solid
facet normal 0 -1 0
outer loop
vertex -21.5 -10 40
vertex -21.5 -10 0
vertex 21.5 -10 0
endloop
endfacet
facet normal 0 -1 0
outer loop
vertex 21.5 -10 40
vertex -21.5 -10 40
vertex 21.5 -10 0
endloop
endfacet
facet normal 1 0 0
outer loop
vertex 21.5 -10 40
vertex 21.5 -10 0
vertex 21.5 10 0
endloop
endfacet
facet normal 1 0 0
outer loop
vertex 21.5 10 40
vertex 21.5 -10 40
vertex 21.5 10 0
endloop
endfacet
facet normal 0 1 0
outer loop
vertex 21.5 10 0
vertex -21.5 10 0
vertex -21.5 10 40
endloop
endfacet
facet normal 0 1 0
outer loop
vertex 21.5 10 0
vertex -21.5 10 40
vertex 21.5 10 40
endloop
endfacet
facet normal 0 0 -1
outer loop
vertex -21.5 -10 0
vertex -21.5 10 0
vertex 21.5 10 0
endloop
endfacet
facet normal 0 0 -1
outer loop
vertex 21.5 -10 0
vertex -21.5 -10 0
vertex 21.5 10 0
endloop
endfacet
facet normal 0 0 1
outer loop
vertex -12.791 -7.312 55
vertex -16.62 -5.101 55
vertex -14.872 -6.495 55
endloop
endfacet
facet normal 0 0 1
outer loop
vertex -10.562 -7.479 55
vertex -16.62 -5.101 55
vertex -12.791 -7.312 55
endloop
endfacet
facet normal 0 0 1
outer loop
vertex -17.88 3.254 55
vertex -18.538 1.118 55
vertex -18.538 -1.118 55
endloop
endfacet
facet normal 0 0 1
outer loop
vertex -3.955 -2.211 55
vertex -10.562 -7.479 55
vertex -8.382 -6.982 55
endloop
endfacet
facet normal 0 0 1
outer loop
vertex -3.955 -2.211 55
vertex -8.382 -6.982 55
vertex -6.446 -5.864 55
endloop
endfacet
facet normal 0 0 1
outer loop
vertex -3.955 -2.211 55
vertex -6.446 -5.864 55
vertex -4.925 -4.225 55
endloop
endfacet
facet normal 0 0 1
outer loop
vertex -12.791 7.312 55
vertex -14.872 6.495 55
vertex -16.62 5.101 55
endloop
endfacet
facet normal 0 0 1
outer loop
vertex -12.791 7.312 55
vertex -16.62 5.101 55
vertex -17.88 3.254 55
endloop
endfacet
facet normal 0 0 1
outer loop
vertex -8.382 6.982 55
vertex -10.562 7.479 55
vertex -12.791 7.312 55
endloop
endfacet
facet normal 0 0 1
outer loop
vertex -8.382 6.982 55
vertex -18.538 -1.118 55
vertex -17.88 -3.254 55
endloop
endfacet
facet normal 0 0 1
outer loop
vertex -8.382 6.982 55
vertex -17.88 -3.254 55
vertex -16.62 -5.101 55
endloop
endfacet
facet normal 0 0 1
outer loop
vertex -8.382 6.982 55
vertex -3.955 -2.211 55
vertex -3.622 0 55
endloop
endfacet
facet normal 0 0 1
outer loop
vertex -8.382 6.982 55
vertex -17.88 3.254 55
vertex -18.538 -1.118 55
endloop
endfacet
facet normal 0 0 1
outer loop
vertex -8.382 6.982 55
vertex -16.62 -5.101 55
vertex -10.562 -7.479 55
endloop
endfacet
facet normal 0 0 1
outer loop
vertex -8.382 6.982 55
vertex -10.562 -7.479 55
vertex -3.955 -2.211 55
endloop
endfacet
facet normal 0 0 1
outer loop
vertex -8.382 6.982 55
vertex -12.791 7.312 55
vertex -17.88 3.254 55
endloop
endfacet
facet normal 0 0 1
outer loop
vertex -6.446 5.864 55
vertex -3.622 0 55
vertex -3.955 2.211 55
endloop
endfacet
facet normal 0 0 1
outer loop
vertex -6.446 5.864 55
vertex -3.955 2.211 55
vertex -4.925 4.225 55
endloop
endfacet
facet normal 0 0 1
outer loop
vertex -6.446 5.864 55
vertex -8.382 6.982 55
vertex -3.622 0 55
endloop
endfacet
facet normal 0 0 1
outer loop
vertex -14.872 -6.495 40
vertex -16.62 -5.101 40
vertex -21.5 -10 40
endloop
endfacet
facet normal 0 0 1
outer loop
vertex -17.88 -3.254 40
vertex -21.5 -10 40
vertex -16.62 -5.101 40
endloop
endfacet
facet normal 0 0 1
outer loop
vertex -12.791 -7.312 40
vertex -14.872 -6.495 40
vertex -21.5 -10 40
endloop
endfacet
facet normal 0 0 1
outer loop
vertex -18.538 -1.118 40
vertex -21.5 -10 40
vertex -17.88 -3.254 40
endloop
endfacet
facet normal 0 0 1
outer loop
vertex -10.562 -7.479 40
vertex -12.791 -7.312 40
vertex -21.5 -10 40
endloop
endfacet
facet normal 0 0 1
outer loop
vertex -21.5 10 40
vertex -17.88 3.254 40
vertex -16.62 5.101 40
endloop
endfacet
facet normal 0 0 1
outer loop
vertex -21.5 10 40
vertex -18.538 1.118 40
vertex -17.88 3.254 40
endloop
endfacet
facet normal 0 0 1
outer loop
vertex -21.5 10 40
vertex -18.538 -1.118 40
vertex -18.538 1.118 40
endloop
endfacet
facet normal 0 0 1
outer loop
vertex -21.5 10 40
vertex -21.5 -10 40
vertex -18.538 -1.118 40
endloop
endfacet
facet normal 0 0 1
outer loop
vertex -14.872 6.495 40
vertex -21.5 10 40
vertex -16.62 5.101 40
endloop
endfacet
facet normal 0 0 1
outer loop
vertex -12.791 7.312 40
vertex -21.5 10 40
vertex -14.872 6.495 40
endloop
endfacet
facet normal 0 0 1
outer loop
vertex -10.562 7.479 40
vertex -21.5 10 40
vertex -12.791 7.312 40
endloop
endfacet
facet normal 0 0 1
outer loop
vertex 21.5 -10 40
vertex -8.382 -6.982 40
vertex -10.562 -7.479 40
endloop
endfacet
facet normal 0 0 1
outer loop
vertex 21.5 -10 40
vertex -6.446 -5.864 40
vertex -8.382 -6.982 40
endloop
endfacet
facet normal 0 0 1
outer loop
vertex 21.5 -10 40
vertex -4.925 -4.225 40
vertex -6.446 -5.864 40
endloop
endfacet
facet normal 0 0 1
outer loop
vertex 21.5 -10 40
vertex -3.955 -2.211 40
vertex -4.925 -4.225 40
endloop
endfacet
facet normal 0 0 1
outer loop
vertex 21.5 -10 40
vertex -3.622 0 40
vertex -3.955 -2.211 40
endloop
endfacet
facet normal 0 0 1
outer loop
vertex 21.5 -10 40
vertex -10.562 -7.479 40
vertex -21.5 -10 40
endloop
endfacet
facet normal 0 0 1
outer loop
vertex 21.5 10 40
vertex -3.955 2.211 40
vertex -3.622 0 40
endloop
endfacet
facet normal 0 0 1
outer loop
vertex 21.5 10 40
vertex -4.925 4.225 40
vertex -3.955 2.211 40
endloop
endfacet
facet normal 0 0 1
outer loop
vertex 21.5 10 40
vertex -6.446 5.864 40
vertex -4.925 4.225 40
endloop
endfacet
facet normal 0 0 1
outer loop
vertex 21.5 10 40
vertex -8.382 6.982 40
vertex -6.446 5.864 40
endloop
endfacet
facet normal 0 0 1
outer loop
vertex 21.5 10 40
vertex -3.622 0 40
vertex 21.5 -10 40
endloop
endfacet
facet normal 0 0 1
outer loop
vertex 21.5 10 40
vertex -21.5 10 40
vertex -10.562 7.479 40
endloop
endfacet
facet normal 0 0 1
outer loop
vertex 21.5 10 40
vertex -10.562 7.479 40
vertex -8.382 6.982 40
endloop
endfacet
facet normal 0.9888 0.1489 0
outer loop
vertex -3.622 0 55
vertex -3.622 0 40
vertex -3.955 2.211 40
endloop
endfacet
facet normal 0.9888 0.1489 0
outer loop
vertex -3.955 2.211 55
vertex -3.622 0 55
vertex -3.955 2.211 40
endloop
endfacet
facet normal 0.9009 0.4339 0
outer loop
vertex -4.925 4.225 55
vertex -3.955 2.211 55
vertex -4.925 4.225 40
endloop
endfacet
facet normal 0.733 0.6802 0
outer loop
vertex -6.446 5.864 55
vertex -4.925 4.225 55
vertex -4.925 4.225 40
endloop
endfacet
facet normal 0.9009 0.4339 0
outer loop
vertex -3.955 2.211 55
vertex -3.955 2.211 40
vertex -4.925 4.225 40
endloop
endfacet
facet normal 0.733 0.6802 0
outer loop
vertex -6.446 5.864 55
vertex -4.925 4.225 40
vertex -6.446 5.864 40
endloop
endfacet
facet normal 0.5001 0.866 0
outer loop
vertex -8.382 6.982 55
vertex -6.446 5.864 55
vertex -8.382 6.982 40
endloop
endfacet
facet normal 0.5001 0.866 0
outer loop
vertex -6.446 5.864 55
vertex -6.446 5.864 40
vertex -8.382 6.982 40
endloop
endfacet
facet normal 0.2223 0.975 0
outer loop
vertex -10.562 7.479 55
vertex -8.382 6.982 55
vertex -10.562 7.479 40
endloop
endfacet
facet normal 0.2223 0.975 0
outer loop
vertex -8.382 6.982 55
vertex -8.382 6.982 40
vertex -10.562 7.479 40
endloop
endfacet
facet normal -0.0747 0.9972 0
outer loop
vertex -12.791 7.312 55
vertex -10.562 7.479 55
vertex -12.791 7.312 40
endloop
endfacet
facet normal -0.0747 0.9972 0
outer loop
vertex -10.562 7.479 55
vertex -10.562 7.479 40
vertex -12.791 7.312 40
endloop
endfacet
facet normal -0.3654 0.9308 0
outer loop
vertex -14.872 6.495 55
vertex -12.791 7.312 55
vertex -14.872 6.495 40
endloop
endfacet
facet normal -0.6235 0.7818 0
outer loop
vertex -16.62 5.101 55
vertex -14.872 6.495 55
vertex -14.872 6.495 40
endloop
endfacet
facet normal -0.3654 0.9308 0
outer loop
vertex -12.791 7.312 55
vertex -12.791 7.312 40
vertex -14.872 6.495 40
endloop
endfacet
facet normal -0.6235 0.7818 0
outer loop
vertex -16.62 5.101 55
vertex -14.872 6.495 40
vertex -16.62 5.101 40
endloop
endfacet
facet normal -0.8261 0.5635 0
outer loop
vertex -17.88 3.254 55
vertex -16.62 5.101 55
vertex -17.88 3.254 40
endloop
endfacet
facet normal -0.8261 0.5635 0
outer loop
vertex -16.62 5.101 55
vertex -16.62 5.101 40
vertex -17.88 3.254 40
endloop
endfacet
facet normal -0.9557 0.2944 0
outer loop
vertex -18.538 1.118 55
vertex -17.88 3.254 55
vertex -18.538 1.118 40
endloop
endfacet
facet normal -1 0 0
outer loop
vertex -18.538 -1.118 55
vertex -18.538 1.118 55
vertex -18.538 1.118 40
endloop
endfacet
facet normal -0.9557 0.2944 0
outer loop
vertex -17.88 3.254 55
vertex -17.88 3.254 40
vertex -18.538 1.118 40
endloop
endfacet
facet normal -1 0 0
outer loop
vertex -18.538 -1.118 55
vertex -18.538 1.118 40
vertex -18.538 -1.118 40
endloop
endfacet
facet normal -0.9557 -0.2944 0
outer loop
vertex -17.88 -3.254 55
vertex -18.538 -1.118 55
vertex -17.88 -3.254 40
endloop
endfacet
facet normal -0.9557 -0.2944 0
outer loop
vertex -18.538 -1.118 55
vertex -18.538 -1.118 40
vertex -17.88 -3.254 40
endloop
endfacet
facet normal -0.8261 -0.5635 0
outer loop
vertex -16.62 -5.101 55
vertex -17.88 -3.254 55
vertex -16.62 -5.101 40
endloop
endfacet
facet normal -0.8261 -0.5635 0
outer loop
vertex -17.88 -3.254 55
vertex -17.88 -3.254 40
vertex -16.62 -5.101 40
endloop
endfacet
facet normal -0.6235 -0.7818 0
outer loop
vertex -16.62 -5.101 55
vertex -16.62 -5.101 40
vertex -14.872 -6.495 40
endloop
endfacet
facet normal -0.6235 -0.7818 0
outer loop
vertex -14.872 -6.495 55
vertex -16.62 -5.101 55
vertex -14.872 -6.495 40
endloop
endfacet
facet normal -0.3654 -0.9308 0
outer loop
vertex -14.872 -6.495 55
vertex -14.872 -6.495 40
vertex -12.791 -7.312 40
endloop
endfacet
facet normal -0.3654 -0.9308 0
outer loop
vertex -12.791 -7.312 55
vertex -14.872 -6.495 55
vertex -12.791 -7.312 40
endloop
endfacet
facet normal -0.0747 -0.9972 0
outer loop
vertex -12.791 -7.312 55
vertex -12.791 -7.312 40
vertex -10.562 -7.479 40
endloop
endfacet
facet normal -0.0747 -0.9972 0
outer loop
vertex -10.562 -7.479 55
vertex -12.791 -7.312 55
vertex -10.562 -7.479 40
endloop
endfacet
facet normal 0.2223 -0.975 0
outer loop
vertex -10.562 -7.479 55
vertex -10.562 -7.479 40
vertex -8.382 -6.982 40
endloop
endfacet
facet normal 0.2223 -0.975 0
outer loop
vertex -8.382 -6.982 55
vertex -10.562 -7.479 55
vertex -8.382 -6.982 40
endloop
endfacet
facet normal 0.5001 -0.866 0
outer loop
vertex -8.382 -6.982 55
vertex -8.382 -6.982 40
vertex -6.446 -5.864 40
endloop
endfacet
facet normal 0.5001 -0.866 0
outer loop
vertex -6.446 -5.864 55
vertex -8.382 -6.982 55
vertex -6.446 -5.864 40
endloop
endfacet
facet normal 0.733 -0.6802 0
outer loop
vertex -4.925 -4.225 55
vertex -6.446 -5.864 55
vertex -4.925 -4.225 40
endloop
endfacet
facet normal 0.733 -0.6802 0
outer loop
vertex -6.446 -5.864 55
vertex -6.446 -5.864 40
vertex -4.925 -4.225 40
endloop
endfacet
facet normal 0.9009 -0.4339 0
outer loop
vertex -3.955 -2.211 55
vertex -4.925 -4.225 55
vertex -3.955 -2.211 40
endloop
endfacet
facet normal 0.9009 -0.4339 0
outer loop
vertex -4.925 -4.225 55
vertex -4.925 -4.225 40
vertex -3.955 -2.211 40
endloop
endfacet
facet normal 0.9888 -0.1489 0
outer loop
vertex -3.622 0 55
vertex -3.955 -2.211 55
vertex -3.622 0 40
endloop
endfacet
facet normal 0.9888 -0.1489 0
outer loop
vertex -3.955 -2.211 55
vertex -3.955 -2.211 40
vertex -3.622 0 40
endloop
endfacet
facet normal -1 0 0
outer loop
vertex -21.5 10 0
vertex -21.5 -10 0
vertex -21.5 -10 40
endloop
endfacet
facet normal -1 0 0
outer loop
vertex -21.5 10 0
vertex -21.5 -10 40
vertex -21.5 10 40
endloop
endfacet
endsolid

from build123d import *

# Parameters (mm, degrees)
SKETCH1_W           = 43
SKETCH1_H           = 20
BOSS_EXTRUDE1_DEPTH = 40
SKETCH2_R           = 7.5
BOSS_EXTRUDE2_DEPTH = 15


with BuildPart() as part:
    # Sketch1 → Boss-Extrude1 (new body)
    with BuildSketch(Plane.XY):
        Rectangle(SKETCH1_W, SKETCH1_H)
    extrude(amount=BOSS_EXTRUDE1_DEPTH)

    # Sketch2 → Boss-Extrude2 (add)
    with BuildSketch(Plane.XY.offset(40)):
        with Locations((-11.122255155, 0)):
            Circle(SKETCH2_R)
    extrude(amount=BOSS_EXTRUDE2_DEPTH)


solid = part.part
